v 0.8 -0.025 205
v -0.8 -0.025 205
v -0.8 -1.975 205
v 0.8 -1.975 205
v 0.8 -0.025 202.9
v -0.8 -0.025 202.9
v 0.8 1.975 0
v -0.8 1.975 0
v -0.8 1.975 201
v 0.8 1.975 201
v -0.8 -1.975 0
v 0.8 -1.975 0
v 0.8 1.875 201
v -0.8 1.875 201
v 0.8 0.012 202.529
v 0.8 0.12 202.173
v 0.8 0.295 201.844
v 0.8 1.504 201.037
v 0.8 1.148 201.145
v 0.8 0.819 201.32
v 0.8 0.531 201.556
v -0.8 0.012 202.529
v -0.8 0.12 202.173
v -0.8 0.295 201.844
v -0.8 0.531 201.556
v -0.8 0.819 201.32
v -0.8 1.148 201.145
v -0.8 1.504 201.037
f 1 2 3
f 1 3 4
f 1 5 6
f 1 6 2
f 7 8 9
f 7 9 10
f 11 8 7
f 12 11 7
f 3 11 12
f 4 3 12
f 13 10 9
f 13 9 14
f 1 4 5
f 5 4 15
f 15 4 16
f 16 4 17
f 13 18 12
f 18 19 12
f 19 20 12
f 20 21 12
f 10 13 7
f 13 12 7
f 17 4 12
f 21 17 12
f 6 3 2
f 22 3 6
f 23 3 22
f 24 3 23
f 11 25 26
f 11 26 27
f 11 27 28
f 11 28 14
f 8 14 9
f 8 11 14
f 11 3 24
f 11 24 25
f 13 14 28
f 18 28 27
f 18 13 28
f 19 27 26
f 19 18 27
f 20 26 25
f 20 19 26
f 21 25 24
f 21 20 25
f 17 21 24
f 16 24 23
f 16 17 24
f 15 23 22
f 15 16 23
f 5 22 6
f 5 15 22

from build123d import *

# Parameters (mm, degrees)
SKETCH1_W           = 1.6
SKETCH1_H           = 3.95
BOSS_EXTRUDE1_DEPTH = 205
CUT_EXTRUDE1_DEPTH  = 205


with BuildPart() as part:
    # Sketch1 → Boss-Extrude1 (new body)
    with BuildSketch(Plane.XY):
        Rectangle(SKETCH1_W, SKETCH1_H)
    extrude(amount=BOSS_EXTRUDE1_DEPTH)

    # Sketch2 → Cut-Extrude1 (cut)
    with BuildSketch(Plane(origin=(0.8, 0, 0), x_dir=(0, 0, -1), z_dir=(1, 0, 0))):
        with BuildLine():
            Line((-205, 1.975), (-201, 1.975))
            Line((-201, 1.975), (-201, 1.875))
            ThreePointArc((-201, 1.875), (-201.556497116, 0.531497116), (-202.9, -0.025))
            Line((-202.9, -0.025), (-205, -0.025))
            Line((-205, -0.025), (-205, 1.975))
        make_face()
    extrude(amount=-CUT_EXTRUDE1_DEPTH, mode=Mode.SUBTRACT)


solid = part.part
